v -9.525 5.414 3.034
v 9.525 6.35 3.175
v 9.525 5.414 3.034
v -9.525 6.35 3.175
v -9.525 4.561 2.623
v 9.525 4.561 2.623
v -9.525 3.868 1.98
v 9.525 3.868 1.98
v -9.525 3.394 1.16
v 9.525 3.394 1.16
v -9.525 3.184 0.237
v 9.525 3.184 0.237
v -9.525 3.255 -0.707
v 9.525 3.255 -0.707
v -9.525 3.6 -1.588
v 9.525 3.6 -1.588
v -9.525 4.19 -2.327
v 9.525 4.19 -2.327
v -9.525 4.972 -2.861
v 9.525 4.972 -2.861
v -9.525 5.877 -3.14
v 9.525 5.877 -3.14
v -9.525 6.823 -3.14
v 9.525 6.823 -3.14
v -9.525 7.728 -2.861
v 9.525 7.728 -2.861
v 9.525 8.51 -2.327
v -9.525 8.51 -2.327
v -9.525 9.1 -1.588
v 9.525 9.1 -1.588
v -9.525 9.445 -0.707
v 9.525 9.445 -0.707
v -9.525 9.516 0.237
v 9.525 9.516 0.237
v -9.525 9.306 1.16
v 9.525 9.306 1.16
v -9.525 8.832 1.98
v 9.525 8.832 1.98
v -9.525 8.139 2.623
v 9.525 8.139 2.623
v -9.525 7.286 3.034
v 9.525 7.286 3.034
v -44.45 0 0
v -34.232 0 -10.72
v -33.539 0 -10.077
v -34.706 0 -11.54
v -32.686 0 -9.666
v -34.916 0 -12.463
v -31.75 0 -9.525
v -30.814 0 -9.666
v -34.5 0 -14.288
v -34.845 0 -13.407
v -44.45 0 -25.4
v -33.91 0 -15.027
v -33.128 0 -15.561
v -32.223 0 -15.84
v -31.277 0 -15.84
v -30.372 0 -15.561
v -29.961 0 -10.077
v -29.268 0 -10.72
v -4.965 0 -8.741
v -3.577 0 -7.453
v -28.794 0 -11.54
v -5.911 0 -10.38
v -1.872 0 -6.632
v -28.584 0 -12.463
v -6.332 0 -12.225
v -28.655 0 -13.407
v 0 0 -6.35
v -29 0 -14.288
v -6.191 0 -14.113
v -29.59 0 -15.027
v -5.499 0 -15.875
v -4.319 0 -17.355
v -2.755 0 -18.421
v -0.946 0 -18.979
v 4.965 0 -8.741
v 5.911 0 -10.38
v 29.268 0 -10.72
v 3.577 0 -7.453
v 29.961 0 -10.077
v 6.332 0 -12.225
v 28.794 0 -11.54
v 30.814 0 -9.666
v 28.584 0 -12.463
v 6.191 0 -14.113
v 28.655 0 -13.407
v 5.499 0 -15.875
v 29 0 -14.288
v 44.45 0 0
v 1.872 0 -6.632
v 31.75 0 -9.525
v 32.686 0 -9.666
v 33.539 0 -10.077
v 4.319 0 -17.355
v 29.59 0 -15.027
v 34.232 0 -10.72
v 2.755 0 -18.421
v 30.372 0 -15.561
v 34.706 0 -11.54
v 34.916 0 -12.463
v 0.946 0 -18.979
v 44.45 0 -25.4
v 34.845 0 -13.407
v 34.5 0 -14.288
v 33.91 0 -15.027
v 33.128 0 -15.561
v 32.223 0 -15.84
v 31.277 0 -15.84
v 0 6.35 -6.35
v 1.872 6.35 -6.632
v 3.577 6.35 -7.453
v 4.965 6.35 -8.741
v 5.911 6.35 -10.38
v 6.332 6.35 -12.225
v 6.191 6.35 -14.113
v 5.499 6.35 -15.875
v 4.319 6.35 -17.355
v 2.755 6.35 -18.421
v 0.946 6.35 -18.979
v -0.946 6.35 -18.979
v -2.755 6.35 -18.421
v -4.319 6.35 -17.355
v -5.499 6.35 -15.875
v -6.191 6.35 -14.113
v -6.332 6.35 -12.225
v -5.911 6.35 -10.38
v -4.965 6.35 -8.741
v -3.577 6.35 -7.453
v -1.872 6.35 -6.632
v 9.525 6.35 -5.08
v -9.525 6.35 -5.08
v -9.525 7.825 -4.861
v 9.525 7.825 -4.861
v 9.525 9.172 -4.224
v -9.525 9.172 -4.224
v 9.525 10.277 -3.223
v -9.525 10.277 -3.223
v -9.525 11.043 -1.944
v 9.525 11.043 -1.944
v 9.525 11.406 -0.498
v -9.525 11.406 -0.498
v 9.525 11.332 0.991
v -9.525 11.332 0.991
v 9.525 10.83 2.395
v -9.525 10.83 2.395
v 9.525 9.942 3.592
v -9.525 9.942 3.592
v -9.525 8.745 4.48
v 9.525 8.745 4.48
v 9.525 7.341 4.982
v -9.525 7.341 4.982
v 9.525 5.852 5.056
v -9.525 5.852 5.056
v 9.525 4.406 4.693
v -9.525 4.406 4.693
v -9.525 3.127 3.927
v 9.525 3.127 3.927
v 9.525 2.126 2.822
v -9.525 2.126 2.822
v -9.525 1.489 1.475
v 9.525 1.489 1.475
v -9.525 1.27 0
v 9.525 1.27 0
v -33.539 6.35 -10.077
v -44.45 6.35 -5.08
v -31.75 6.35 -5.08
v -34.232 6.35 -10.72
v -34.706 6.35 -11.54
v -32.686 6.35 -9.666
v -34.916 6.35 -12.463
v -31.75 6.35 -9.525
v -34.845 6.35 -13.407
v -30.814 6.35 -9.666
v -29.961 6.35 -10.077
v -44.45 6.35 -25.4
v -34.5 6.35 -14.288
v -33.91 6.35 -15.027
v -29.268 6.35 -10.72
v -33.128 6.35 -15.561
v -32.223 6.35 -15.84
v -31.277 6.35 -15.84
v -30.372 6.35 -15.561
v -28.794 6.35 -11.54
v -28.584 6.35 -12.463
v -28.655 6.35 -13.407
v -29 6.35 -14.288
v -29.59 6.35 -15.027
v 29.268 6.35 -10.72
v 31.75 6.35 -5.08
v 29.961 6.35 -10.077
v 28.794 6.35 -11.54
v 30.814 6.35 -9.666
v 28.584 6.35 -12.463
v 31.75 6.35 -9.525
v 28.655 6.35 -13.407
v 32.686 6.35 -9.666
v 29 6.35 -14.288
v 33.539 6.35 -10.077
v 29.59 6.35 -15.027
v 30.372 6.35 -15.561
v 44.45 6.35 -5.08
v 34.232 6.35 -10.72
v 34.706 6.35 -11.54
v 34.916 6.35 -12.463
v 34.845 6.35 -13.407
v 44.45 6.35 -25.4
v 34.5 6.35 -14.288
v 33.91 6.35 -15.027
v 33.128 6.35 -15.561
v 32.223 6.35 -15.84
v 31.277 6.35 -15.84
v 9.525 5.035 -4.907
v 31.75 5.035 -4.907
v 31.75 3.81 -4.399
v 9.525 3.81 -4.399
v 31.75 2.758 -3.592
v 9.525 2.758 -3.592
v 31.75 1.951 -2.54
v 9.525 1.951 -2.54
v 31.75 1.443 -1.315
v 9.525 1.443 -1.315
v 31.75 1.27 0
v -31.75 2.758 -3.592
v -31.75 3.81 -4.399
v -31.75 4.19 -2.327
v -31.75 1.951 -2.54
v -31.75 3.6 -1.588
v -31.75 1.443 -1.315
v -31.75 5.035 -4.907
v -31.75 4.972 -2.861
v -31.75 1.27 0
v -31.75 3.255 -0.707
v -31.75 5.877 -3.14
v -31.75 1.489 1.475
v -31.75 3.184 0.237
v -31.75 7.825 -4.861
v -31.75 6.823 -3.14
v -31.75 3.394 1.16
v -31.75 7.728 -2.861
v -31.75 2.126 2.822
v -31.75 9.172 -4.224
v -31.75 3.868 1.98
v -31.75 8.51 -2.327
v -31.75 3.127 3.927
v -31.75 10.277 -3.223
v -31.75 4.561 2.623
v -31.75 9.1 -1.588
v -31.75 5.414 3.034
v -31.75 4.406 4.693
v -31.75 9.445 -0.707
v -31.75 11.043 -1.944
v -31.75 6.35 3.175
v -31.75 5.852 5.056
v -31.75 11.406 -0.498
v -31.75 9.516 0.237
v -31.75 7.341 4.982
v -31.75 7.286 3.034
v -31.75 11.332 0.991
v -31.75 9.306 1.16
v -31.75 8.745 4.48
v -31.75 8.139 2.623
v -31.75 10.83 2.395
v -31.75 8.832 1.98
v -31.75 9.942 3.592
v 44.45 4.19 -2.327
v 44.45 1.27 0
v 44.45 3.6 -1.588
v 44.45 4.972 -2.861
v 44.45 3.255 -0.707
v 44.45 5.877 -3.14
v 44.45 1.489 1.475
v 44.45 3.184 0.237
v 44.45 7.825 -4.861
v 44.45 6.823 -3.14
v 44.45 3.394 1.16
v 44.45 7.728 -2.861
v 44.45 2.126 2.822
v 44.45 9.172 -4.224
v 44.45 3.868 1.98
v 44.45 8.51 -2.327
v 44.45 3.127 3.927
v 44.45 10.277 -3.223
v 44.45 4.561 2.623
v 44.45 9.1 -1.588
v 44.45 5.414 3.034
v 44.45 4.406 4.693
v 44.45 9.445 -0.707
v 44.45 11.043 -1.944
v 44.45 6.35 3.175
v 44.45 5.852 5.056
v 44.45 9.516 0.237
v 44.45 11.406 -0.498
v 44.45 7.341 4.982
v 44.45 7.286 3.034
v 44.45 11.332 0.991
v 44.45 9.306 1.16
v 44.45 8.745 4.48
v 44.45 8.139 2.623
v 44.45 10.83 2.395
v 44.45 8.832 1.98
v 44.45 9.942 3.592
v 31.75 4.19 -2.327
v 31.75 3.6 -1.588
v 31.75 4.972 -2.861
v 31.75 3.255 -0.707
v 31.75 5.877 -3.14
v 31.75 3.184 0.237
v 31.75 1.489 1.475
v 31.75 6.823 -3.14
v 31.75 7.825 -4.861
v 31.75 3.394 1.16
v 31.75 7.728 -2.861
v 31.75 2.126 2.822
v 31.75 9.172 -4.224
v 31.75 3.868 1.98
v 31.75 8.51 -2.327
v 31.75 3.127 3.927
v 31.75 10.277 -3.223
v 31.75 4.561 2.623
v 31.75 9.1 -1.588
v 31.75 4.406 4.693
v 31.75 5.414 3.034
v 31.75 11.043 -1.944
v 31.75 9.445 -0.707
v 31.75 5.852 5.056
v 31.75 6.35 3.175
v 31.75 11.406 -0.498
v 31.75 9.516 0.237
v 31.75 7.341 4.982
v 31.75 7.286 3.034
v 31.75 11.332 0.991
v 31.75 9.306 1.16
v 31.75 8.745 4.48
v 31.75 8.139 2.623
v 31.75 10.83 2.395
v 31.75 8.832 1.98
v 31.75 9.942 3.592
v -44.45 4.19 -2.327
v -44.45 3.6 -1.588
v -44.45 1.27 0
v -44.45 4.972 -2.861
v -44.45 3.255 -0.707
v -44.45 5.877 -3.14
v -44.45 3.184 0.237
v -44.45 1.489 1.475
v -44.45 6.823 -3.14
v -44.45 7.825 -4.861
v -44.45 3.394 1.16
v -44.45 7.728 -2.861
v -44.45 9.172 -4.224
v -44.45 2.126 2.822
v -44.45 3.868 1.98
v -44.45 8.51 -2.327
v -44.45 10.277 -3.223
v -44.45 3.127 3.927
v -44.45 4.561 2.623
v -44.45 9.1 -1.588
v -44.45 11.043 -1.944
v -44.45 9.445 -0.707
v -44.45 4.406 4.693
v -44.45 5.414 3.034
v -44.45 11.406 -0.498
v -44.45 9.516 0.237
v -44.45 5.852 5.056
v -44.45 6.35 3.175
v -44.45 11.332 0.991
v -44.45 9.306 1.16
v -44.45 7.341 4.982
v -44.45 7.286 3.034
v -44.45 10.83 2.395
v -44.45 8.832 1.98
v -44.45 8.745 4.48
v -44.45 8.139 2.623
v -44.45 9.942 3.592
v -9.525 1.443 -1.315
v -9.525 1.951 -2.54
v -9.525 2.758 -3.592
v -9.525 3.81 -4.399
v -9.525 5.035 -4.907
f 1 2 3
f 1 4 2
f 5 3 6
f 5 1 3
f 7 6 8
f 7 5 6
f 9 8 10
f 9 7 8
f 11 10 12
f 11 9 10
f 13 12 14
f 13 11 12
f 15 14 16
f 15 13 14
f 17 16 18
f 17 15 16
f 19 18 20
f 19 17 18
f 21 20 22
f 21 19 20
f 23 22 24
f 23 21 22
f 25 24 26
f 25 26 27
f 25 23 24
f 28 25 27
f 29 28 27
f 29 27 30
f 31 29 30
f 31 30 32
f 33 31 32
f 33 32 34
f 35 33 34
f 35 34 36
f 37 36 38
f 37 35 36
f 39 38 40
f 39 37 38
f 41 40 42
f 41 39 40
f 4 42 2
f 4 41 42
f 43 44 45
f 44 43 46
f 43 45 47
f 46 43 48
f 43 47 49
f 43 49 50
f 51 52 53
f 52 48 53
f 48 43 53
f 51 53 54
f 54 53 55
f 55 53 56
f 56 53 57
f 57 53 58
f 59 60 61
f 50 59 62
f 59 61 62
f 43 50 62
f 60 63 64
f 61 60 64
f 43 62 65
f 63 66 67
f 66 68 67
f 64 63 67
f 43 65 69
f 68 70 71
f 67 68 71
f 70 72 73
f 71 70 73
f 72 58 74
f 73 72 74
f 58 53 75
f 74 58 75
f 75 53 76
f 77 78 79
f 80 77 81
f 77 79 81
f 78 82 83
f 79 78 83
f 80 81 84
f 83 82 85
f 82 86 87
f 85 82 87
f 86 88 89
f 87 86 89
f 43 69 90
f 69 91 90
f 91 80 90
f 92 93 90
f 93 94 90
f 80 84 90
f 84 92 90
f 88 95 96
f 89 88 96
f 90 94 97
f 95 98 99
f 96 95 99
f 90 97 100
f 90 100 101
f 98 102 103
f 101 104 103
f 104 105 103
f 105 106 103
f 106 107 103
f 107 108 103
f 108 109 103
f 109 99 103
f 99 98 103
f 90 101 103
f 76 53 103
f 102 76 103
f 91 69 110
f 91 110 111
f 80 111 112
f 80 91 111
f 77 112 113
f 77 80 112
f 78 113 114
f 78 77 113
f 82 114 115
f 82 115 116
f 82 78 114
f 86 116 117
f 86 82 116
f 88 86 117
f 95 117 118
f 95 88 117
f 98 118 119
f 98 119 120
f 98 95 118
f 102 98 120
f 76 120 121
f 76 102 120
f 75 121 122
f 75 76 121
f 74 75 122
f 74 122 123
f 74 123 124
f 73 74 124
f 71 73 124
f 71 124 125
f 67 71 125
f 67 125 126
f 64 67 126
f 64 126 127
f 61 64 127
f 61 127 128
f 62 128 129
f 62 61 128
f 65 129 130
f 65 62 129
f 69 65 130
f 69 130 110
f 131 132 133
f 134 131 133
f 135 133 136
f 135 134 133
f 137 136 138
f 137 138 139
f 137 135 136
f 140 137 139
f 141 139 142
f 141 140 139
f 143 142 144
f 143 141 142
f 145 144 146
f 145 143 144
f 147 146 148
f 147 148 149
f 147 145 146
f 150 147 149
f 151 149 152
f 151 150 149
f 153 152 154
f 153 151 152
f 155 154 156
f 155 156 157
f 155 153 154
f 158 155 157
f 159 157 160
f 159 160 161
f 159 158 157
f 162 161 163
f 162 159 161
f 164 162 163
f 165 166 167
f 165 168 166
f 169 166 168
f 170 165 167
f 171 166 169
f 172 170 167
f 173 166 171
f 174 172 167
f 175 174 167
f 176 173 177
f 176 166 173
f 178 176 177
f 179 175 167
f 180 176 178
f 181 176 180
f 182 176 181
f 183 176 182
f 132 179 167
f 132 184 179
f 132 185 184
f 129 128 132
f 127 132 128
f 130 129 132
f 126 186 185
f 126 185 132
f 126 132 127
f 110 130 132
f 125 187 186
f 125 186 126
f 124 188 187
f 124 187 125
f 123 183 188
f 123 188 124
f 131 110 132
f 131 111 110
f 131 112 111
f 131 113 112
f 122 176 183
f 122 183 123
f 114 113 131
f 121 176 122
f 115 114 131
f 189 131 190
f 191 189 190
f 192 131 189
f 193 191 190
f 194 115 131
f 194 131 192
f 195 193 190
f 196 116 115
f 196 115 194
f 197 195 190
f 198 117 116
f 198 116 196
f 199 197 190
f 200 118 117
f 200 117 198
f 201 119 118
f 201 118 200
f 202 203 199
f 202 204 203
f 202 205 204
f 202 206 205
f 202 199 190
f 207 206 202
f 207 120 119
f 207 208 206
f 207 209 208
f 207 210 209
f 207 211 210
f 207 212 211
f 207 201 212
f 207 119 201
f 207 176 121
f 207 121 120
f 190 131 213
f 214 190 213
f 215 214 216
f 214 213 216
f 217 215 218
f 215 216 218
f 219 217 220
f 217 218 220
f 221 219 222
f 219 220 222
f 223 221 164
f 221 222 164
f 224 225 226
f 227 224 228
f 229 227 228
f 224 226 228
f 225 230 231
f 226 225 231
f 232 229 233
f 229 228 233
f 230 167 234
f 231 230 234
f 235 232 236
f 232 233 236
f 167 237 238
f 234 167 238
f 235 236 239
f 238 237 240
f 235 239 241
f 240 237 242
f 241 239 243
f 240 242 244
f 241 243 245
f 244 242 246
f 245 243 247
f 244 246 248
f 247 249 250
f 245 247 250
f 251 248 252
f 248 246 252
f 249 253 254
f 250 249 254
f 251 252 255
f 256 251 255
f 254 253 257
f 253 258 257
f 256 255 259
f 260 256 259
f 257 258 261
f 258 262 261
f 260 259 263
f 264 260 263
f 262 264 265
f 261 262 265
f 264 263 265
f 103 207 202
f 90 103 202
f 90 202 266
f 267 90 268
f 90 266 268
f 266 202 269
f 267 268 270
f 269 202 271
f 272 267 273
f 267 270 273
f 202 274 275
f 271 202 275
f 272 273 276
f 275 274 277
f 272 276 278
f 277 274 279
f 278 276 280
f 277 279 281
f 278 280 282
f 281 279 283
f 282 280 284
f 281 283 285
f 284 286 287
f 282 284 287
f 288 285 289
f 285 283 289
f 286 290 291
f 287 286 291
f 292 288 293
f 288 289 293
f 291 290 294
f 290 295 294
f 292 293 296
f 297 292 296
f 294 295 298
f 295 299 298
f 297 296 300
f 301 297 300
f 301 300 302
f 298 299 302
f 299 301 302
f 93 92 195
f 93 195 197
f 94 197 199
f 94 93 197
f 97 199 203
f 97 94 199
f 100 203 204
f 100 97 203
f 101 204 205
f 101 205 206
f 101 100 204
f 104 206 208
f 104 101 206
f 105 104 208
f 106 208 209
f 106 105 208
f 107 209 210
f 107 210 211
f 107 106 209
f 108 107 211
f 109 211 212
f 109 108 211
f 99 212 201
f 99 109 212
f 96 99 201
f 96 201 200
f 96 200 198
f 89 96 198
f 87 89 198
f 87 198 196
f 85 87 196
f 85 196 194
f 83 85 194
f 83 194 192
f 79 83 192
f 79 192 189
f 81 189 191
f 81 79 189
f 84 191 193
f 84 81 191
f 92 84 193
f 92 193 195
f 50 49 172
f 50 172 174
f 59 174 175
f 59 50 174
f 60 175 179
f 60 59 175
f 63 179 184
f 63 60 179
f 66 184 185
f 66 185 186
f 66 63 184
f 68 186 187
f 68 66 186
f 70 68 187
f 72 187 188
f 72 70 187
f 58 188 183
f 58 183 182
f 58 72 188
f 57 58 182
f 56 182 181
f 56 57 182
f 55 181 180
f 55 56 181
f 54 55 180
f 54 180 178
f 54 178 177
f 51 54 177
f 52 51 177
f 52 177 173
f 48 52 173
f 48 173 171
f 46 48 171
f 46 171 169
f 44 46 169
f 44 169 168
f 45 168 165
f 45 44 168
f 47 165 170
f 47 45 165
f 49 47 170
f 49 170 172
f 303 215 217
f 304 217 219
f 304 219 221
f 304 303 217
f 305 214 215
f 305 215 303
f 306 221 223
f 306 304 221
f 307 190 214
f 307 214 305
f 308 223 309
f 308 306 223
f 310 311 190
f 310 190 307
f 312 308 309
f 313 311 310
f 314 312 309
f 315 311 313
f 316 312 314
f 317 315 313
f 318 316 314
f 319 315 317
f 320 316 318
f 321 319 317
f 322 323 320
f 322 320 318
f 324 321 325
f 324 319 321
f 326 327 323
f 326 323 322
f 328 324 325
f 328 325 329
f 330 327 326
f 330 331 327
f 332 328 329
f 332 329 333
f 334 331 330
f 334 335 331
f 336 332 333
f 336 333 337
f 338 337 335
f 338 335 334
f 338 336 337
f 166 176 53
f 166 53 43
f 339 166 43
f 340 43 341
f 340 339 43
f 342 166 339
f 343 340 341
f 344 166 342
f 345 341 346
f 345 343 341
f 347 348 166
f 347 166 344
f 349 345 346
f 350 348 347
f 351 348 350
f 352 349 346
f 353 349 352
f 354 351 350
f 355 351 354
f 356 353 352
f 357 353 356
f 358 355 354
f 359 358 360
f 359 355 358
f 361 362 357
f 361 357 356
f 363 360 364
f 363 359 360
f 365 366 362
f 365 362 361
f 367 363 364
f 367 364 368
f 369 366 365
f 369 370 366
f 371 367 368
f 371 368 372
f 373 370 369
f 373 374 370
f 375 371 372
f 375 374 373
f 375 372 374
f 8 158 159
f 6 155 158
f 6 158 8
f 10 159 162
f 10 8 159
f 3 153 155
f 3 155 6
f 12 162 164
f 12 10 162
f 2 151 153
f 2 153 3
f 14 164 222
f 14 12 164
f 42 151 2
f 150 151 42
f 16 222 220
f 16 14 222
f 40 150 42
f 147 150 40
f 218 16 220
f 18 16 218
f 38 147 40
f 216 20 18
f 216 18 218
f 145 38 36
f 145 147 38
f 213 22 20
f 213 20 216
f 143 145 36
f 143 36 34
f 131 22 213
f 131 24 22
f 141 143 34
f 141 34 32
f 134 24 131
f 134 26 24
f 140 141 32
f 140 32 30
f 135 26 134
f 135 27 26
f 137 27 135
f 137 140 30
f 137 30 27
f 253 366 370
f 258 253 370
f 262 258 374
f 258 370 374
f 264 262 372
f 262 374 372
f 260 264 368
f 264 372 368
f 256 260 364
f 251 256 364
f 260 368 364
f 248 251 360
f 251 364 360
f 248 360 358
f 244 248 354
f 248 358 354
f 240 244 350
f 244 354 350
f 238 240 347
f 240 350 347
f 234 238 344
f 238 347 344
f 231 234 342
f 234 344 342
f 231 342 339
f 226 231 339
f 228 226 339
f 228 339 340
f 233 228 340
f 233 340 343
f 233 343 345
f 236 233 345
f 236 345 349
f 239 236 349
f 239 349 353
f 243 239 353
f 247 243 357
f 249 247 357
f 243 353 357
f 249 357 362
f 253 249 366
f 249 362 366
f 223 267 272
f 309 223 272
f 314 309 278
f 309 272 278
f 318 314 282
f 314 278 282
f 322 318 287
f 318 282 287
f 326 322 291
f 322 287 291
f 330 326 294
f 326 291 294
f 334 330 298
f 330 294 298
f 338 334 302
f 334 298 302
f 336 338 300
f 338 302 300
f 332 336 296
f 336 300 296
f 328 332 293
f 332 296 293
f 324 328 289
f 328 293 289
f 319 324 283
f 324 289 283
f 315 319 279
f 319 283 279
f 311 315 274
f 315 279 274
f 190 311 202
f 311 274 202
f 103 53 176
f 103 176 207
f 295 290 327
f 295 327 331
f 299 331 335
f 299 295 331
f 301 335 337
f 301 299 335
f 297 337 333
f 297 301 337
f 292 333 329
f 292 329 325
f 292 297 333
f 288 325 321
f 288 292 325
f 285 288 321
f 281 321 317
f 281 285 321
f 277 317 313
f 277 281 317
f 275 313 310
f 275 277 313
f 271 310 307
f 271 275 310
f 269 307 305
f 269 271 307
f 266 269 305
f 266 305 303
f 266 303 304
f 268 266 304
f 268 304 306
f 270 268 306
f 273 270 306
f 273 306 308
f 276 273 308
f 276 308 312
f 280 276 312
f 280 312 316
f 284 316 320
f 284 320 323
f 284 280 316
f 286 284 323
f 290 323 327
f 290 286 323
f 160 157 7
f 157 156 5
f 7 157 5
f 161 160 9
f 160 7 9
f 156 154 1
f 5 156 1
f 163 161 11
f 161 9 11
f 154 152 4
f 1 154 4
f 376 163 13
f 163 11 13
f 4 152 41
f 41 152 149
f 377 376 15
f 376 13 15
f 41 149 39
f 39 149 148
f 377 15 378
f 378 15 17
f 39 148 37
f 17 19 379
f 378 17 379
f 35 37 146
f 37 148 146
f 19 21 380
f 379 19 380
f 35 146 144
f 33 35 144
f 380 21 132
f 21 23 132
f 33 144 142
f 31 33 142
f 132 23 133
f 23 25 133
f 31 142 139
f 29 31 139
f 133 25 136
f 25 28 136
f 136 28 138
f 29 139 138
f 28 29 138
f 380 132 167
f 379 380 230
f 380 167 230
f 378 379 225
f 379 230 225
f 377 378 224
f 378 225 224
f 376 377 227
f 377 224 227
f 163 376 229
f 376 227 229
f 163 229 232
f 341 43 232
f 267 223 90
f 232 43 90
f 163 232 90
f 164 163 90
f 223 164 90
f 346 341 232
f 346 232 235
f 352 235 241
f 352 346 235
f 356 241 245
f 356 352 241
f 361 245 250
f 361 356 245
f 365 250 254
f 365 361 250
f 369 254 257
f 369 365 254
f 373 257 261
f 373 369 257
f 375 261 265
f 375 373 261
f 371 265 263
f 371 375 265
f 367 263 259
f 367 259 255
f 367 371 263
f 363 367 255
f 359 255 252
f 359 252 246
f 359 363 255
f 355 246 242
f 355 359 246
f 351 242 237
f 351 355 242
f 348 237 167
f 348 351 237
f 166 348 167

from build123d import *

# Parameters (mm, degrees)
SKETCH2_W           = 88.9
SKETCH2_H           = 25.4
SKETCH2_R           = 3.175
SKETCH2_R_2         = 6.35
BOSS_EXTRUDE1_DEPTH = 6.35
SKETCH3_R           = 5.08
CUT_EXTRUDE1_DEPTH  = 93.675198948
SKETCH4_R           = 5.08
SKETCH4_R_2         = 3.175
BOSS_EXTRUDE2_DEPTH = 12.7
SKETCH5_R           = 5.08
SKETCH5_R_2         = 3.175
BOSS_EXTRUDE3_DEPTH = 9.525


with BuildPart() as part:
    # Sketch2 → Boss-Extrude1 (new body)
    with BuildSketch(Plane(origin=(0, 0, 0), x_dir=(1, 0, 0), z_dir=(0, 1, 0))):
        with Locations((0, 12.7)):
            Rectangle(SKETCH2_W, SKETCH2_H)
        with Locations(Location((-31.75, 12.7, 0), (0, 0, 270))):
            Circle(SKETCH2_R, mode=Mode.SUBTRACT)
        with Locations(Location((0, 12.7, 0), (0, 0, 270))):
            Circle(SKETCH2_R_2, mode=Mode.SUBTRACT)
        with Locations(Location((31.75, 12.7, 0), (0, 0, 270))):
            Circle(SKETCH2_R, mode=Mode.SUBTRACT)
    extrude(amount=BOSS_EXTRUDE1_DEPTH)

    # Sketch3 → Cut-Extrude1 (cut, through all)
    with BuildSketch(Plane.ZY.offset(44.45)):
        with Locations((0, 6.35)):
            Circle(SKETCH3_R)
    extrude(amount=-CUT_EXTRUDE1_DEPTH, mode=Mode.SUBTRACT)

    # Sketch4 → Boss-Extrude2 (add)
    with BuildSketch(Plane.ZY.offset(44.45)):
        with Locations((0, 6.35)):
            Circle(SKETCH4_R)
        with Locations((0, 6.35)):
            Circle(SKETCH4_R_2, mode=Mode.SUBTRACT)
    boss_extrude2 = extrude(amount=-BOSS_EXTRUDE2_DEPTH)

    # Mirror1: Boss-Extrude2 across plane
    add(boss_extrude2.mirror(Plane(origin=(0, 0, 0), x_dir=(0, 0, 1), z_dir=(1, 0, 0))))

    # Sketch5 → Boss-Extrude3 (add, symmetric)
    with BuildSketch(Plane(origin=(0, 0, 0), x_dir=(0, 0, -1), z_dir=(1, 0, 0))):
        with Locations((0, 6.35)):
            Circle(SKETCH5_R)
        with Locations(Location((0, 6.35, 0), (0, 0, 180))):
            Circle(SKETCH5_R_2, mode=Mode.SUBTRACT)
    extrude(amount=BOSS_EXTRUDE3_DEPTH, both=True)


solid = part.part
